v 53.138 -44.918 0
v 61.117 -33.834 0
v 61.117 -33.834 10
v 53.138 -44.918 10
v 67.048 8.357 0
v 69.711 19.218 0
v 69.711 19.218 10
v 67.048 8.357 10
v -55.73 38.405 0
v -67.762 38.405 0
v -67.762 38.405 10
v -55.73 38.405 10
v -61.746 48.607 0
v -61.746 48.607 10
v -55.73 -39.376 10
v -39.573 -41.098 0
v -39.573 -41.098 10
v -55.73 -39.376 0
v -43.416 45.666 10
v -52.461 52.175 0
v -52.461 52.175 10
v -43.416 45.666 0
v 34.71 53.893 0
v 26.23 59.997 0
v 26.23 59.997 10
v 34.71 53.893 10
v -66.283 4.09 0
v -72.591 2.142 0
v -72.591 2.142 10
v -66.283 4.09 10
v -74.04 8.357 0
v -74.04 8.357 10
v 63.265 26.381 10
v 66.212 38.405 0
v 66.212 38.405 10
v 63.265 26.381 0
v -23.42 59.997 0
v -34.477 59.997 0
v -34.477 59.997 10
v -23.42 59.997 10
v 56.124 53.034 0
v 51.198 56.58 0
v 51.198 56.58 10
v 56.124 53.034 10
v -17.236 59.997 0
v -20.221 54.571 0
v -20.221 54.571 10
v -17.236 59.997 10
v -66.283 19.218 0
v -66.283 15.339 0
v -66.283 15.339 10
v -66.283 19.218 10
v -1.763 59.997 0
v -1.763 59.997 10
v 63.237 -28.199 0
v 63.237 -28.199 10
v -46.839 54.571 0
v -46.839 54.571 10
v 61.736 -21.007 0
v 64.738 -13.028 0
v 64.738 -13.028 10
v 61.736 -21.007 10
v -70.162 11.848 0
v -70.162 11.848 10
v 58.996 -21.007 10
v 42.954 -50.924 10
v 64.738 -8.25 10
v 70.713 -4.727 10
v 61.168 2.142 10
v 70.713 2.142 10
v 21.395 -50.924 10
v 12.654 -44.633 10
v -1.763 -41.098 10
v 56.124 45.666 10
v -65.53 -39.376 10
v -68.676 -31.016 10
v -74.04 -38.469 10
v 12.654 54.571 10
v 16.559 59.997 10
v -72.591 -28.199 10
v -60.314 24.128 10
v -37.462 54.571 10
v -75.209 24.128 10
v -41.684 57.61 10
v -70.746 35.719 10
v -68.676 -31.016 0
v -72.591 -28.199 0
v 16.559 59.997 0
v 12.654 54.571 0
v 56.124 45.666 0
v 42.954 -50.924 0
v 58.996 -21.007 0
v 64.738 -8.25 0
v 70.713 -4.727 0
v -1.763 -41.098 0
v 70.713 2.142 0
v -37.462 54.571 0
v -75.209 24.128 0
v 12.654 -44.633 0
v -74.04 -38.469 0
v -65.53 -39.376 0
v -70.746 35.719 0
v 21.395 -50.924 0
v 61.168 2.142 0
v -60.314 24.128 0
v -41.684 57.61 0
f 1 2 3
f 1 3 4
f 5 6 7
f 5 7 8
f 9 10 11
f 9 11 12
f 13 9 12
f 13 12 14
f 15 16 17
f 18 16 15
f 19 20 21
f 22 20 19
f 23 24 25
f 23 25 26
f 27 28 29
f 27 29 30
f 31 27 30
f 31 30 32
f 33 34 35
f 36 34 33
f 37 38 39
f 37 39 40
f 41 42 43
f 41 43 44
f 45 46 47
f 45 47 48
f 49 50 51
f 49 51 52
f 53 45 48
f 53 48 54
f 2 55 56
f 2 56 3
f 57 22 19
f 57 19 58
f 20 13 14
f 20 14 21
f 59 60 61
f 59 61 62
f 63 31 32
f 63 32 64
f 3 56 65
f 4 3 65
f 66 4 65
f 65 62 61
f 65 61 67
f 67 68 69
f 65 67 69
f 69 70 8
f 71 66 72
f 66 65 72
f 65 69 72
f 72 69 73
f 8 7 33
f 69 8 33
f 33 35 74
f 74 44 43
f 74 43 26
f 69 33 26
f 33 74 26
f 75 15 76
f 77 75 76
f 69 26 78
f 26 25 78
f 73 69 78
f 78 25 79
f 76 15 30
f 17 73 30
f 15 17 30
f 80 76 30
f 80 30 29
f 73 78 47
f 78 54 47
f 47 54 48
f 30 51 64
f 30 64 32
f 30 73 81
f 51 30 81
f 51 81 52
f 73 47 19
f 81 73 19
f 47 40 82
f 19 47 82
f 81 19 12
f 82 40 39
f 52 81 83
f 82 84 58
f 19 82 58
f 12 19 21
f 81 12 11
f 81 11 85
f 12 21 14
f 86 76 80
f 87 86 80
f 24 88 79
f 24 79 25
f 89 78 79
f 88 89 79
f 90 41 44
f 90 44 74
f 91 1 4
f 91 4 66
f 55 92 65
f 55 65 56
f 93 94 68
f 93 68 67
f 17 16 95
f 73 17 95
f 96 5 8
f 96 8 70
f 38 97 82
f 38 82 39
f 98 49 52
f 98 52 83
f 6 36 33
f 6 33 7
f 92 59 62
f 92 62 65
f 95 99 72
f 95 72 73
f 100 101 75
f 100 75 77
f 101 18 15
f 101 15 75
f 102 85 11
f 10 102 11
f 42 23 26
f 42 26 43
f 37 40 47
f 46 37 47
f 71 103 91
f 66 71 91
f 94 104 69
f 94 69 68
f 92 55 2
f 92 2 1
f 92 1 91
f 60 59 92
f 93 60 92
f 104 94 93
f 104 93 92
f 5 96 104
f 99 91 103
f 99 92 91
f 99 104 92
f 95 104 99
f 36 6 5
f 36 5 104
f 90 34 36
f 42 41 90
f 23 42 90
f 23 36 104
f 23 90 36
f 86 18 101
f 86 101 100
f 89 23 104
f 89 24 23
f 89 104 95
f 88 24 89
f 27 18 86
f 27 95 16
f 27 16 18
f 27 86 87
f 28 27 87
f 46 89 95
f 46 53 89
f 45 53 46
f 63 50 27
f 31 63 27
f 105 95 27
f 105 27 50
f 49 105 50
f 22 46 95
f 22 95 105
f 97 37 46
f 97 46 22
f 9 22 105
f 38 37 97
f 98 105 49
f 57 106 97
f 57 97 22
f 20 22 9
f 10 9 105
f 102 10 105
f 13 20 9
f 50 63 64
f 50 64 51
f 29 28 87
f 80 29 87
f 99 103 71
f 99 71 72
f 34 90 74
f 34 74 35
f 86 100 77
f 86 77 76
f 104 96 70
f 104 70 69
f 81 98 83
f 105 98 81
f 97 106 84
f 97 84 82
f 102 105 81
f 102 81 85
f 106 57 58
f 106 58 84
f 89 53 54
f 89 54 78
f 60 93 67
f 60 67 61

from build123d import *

# Parameters (mm, degrees)
EXTRUDE_1_DEPTH = 10


with BuildPart() as part:
    # Эскиз1 → Бобышка-Вытянуть1 (new body)
    with BuildSketch(Plane.XY):
        Polygon((-66.282586336, 4.09041909), (-74.040470763, 8.357255525), (-70.161528549, 11.848303517), (-66.282586336, 15.339351509), (-66.282586336, 19.218293722), (-75.209365057, 24.128022019), (-60.314226958, 24.128022019), (-70.745975697, 35.71885395), (-67.761796008, 38.40461567), (-55.730109265, 38.40461567), (-61.745952636, 48.606953693), (-52.460988202, 52.175342696), (-43.416291781, 45.665500099), (-46.838743542, 54.570735165), (-41.684369065, 57.610029636), (-37.461610157, 54.570735165), (-34.477282264, 59.996785881), (-23.420274879, 59.996785881), (-20.22078559, 54.570735165), (-17.236457696, 59.996785881), (-1.763387891, 59.996785881), (12.653887704, 54.570735165), (16.559241123, 59.996785881), (26.230185451, 59.996785881), (34.710427131, 53.893204737), (51.197564442, 56.580039943), (56.124240189, 53.034107371), (56.124240189, 45.665500099), (66.212425028, 38.40461567), (63.264526212, 26.381057915), (69.711013986, 19.218293722), (67.048138131, 8.357255525), (70.712863391, 2.142205771), (61.168332609, 2.142205771), (70.712863391, -4.727388317), (64.73847562, -8.250206419), (64.73847562, -13.02813029), (61.735677356, -21.006708523), (58.995962435, -21.006708523), (63.237076488, -28.199262665), (61.116519462, -33.833683844), (53.138381044, -44.918412685), (42.953995786, -50.923670147), (34.710427131, -50.923670147), (21.394713287, -50.923670147), (12.653887704, -44.632535977), (-1.763387891, -41.097752801), (-17.236457696, -41.097752801), (-39.572989611, -41.097752801), (-55.730109265, -39.376048265), (-65.530101327, -39.376048265), (-74.040470763, -38.469182314), (-68.6764474, -31.016473255), (-72.590645655, -28.199262665), (-72.590645655, -19.765075522), (-72.590645655, -11.813243984), (-72.590645655, -8.250206419), (-72.590645655, 2.142205771), align=None)
    extrude(amount=EXTRUDE_1_DEPTH)


solid = part.part
